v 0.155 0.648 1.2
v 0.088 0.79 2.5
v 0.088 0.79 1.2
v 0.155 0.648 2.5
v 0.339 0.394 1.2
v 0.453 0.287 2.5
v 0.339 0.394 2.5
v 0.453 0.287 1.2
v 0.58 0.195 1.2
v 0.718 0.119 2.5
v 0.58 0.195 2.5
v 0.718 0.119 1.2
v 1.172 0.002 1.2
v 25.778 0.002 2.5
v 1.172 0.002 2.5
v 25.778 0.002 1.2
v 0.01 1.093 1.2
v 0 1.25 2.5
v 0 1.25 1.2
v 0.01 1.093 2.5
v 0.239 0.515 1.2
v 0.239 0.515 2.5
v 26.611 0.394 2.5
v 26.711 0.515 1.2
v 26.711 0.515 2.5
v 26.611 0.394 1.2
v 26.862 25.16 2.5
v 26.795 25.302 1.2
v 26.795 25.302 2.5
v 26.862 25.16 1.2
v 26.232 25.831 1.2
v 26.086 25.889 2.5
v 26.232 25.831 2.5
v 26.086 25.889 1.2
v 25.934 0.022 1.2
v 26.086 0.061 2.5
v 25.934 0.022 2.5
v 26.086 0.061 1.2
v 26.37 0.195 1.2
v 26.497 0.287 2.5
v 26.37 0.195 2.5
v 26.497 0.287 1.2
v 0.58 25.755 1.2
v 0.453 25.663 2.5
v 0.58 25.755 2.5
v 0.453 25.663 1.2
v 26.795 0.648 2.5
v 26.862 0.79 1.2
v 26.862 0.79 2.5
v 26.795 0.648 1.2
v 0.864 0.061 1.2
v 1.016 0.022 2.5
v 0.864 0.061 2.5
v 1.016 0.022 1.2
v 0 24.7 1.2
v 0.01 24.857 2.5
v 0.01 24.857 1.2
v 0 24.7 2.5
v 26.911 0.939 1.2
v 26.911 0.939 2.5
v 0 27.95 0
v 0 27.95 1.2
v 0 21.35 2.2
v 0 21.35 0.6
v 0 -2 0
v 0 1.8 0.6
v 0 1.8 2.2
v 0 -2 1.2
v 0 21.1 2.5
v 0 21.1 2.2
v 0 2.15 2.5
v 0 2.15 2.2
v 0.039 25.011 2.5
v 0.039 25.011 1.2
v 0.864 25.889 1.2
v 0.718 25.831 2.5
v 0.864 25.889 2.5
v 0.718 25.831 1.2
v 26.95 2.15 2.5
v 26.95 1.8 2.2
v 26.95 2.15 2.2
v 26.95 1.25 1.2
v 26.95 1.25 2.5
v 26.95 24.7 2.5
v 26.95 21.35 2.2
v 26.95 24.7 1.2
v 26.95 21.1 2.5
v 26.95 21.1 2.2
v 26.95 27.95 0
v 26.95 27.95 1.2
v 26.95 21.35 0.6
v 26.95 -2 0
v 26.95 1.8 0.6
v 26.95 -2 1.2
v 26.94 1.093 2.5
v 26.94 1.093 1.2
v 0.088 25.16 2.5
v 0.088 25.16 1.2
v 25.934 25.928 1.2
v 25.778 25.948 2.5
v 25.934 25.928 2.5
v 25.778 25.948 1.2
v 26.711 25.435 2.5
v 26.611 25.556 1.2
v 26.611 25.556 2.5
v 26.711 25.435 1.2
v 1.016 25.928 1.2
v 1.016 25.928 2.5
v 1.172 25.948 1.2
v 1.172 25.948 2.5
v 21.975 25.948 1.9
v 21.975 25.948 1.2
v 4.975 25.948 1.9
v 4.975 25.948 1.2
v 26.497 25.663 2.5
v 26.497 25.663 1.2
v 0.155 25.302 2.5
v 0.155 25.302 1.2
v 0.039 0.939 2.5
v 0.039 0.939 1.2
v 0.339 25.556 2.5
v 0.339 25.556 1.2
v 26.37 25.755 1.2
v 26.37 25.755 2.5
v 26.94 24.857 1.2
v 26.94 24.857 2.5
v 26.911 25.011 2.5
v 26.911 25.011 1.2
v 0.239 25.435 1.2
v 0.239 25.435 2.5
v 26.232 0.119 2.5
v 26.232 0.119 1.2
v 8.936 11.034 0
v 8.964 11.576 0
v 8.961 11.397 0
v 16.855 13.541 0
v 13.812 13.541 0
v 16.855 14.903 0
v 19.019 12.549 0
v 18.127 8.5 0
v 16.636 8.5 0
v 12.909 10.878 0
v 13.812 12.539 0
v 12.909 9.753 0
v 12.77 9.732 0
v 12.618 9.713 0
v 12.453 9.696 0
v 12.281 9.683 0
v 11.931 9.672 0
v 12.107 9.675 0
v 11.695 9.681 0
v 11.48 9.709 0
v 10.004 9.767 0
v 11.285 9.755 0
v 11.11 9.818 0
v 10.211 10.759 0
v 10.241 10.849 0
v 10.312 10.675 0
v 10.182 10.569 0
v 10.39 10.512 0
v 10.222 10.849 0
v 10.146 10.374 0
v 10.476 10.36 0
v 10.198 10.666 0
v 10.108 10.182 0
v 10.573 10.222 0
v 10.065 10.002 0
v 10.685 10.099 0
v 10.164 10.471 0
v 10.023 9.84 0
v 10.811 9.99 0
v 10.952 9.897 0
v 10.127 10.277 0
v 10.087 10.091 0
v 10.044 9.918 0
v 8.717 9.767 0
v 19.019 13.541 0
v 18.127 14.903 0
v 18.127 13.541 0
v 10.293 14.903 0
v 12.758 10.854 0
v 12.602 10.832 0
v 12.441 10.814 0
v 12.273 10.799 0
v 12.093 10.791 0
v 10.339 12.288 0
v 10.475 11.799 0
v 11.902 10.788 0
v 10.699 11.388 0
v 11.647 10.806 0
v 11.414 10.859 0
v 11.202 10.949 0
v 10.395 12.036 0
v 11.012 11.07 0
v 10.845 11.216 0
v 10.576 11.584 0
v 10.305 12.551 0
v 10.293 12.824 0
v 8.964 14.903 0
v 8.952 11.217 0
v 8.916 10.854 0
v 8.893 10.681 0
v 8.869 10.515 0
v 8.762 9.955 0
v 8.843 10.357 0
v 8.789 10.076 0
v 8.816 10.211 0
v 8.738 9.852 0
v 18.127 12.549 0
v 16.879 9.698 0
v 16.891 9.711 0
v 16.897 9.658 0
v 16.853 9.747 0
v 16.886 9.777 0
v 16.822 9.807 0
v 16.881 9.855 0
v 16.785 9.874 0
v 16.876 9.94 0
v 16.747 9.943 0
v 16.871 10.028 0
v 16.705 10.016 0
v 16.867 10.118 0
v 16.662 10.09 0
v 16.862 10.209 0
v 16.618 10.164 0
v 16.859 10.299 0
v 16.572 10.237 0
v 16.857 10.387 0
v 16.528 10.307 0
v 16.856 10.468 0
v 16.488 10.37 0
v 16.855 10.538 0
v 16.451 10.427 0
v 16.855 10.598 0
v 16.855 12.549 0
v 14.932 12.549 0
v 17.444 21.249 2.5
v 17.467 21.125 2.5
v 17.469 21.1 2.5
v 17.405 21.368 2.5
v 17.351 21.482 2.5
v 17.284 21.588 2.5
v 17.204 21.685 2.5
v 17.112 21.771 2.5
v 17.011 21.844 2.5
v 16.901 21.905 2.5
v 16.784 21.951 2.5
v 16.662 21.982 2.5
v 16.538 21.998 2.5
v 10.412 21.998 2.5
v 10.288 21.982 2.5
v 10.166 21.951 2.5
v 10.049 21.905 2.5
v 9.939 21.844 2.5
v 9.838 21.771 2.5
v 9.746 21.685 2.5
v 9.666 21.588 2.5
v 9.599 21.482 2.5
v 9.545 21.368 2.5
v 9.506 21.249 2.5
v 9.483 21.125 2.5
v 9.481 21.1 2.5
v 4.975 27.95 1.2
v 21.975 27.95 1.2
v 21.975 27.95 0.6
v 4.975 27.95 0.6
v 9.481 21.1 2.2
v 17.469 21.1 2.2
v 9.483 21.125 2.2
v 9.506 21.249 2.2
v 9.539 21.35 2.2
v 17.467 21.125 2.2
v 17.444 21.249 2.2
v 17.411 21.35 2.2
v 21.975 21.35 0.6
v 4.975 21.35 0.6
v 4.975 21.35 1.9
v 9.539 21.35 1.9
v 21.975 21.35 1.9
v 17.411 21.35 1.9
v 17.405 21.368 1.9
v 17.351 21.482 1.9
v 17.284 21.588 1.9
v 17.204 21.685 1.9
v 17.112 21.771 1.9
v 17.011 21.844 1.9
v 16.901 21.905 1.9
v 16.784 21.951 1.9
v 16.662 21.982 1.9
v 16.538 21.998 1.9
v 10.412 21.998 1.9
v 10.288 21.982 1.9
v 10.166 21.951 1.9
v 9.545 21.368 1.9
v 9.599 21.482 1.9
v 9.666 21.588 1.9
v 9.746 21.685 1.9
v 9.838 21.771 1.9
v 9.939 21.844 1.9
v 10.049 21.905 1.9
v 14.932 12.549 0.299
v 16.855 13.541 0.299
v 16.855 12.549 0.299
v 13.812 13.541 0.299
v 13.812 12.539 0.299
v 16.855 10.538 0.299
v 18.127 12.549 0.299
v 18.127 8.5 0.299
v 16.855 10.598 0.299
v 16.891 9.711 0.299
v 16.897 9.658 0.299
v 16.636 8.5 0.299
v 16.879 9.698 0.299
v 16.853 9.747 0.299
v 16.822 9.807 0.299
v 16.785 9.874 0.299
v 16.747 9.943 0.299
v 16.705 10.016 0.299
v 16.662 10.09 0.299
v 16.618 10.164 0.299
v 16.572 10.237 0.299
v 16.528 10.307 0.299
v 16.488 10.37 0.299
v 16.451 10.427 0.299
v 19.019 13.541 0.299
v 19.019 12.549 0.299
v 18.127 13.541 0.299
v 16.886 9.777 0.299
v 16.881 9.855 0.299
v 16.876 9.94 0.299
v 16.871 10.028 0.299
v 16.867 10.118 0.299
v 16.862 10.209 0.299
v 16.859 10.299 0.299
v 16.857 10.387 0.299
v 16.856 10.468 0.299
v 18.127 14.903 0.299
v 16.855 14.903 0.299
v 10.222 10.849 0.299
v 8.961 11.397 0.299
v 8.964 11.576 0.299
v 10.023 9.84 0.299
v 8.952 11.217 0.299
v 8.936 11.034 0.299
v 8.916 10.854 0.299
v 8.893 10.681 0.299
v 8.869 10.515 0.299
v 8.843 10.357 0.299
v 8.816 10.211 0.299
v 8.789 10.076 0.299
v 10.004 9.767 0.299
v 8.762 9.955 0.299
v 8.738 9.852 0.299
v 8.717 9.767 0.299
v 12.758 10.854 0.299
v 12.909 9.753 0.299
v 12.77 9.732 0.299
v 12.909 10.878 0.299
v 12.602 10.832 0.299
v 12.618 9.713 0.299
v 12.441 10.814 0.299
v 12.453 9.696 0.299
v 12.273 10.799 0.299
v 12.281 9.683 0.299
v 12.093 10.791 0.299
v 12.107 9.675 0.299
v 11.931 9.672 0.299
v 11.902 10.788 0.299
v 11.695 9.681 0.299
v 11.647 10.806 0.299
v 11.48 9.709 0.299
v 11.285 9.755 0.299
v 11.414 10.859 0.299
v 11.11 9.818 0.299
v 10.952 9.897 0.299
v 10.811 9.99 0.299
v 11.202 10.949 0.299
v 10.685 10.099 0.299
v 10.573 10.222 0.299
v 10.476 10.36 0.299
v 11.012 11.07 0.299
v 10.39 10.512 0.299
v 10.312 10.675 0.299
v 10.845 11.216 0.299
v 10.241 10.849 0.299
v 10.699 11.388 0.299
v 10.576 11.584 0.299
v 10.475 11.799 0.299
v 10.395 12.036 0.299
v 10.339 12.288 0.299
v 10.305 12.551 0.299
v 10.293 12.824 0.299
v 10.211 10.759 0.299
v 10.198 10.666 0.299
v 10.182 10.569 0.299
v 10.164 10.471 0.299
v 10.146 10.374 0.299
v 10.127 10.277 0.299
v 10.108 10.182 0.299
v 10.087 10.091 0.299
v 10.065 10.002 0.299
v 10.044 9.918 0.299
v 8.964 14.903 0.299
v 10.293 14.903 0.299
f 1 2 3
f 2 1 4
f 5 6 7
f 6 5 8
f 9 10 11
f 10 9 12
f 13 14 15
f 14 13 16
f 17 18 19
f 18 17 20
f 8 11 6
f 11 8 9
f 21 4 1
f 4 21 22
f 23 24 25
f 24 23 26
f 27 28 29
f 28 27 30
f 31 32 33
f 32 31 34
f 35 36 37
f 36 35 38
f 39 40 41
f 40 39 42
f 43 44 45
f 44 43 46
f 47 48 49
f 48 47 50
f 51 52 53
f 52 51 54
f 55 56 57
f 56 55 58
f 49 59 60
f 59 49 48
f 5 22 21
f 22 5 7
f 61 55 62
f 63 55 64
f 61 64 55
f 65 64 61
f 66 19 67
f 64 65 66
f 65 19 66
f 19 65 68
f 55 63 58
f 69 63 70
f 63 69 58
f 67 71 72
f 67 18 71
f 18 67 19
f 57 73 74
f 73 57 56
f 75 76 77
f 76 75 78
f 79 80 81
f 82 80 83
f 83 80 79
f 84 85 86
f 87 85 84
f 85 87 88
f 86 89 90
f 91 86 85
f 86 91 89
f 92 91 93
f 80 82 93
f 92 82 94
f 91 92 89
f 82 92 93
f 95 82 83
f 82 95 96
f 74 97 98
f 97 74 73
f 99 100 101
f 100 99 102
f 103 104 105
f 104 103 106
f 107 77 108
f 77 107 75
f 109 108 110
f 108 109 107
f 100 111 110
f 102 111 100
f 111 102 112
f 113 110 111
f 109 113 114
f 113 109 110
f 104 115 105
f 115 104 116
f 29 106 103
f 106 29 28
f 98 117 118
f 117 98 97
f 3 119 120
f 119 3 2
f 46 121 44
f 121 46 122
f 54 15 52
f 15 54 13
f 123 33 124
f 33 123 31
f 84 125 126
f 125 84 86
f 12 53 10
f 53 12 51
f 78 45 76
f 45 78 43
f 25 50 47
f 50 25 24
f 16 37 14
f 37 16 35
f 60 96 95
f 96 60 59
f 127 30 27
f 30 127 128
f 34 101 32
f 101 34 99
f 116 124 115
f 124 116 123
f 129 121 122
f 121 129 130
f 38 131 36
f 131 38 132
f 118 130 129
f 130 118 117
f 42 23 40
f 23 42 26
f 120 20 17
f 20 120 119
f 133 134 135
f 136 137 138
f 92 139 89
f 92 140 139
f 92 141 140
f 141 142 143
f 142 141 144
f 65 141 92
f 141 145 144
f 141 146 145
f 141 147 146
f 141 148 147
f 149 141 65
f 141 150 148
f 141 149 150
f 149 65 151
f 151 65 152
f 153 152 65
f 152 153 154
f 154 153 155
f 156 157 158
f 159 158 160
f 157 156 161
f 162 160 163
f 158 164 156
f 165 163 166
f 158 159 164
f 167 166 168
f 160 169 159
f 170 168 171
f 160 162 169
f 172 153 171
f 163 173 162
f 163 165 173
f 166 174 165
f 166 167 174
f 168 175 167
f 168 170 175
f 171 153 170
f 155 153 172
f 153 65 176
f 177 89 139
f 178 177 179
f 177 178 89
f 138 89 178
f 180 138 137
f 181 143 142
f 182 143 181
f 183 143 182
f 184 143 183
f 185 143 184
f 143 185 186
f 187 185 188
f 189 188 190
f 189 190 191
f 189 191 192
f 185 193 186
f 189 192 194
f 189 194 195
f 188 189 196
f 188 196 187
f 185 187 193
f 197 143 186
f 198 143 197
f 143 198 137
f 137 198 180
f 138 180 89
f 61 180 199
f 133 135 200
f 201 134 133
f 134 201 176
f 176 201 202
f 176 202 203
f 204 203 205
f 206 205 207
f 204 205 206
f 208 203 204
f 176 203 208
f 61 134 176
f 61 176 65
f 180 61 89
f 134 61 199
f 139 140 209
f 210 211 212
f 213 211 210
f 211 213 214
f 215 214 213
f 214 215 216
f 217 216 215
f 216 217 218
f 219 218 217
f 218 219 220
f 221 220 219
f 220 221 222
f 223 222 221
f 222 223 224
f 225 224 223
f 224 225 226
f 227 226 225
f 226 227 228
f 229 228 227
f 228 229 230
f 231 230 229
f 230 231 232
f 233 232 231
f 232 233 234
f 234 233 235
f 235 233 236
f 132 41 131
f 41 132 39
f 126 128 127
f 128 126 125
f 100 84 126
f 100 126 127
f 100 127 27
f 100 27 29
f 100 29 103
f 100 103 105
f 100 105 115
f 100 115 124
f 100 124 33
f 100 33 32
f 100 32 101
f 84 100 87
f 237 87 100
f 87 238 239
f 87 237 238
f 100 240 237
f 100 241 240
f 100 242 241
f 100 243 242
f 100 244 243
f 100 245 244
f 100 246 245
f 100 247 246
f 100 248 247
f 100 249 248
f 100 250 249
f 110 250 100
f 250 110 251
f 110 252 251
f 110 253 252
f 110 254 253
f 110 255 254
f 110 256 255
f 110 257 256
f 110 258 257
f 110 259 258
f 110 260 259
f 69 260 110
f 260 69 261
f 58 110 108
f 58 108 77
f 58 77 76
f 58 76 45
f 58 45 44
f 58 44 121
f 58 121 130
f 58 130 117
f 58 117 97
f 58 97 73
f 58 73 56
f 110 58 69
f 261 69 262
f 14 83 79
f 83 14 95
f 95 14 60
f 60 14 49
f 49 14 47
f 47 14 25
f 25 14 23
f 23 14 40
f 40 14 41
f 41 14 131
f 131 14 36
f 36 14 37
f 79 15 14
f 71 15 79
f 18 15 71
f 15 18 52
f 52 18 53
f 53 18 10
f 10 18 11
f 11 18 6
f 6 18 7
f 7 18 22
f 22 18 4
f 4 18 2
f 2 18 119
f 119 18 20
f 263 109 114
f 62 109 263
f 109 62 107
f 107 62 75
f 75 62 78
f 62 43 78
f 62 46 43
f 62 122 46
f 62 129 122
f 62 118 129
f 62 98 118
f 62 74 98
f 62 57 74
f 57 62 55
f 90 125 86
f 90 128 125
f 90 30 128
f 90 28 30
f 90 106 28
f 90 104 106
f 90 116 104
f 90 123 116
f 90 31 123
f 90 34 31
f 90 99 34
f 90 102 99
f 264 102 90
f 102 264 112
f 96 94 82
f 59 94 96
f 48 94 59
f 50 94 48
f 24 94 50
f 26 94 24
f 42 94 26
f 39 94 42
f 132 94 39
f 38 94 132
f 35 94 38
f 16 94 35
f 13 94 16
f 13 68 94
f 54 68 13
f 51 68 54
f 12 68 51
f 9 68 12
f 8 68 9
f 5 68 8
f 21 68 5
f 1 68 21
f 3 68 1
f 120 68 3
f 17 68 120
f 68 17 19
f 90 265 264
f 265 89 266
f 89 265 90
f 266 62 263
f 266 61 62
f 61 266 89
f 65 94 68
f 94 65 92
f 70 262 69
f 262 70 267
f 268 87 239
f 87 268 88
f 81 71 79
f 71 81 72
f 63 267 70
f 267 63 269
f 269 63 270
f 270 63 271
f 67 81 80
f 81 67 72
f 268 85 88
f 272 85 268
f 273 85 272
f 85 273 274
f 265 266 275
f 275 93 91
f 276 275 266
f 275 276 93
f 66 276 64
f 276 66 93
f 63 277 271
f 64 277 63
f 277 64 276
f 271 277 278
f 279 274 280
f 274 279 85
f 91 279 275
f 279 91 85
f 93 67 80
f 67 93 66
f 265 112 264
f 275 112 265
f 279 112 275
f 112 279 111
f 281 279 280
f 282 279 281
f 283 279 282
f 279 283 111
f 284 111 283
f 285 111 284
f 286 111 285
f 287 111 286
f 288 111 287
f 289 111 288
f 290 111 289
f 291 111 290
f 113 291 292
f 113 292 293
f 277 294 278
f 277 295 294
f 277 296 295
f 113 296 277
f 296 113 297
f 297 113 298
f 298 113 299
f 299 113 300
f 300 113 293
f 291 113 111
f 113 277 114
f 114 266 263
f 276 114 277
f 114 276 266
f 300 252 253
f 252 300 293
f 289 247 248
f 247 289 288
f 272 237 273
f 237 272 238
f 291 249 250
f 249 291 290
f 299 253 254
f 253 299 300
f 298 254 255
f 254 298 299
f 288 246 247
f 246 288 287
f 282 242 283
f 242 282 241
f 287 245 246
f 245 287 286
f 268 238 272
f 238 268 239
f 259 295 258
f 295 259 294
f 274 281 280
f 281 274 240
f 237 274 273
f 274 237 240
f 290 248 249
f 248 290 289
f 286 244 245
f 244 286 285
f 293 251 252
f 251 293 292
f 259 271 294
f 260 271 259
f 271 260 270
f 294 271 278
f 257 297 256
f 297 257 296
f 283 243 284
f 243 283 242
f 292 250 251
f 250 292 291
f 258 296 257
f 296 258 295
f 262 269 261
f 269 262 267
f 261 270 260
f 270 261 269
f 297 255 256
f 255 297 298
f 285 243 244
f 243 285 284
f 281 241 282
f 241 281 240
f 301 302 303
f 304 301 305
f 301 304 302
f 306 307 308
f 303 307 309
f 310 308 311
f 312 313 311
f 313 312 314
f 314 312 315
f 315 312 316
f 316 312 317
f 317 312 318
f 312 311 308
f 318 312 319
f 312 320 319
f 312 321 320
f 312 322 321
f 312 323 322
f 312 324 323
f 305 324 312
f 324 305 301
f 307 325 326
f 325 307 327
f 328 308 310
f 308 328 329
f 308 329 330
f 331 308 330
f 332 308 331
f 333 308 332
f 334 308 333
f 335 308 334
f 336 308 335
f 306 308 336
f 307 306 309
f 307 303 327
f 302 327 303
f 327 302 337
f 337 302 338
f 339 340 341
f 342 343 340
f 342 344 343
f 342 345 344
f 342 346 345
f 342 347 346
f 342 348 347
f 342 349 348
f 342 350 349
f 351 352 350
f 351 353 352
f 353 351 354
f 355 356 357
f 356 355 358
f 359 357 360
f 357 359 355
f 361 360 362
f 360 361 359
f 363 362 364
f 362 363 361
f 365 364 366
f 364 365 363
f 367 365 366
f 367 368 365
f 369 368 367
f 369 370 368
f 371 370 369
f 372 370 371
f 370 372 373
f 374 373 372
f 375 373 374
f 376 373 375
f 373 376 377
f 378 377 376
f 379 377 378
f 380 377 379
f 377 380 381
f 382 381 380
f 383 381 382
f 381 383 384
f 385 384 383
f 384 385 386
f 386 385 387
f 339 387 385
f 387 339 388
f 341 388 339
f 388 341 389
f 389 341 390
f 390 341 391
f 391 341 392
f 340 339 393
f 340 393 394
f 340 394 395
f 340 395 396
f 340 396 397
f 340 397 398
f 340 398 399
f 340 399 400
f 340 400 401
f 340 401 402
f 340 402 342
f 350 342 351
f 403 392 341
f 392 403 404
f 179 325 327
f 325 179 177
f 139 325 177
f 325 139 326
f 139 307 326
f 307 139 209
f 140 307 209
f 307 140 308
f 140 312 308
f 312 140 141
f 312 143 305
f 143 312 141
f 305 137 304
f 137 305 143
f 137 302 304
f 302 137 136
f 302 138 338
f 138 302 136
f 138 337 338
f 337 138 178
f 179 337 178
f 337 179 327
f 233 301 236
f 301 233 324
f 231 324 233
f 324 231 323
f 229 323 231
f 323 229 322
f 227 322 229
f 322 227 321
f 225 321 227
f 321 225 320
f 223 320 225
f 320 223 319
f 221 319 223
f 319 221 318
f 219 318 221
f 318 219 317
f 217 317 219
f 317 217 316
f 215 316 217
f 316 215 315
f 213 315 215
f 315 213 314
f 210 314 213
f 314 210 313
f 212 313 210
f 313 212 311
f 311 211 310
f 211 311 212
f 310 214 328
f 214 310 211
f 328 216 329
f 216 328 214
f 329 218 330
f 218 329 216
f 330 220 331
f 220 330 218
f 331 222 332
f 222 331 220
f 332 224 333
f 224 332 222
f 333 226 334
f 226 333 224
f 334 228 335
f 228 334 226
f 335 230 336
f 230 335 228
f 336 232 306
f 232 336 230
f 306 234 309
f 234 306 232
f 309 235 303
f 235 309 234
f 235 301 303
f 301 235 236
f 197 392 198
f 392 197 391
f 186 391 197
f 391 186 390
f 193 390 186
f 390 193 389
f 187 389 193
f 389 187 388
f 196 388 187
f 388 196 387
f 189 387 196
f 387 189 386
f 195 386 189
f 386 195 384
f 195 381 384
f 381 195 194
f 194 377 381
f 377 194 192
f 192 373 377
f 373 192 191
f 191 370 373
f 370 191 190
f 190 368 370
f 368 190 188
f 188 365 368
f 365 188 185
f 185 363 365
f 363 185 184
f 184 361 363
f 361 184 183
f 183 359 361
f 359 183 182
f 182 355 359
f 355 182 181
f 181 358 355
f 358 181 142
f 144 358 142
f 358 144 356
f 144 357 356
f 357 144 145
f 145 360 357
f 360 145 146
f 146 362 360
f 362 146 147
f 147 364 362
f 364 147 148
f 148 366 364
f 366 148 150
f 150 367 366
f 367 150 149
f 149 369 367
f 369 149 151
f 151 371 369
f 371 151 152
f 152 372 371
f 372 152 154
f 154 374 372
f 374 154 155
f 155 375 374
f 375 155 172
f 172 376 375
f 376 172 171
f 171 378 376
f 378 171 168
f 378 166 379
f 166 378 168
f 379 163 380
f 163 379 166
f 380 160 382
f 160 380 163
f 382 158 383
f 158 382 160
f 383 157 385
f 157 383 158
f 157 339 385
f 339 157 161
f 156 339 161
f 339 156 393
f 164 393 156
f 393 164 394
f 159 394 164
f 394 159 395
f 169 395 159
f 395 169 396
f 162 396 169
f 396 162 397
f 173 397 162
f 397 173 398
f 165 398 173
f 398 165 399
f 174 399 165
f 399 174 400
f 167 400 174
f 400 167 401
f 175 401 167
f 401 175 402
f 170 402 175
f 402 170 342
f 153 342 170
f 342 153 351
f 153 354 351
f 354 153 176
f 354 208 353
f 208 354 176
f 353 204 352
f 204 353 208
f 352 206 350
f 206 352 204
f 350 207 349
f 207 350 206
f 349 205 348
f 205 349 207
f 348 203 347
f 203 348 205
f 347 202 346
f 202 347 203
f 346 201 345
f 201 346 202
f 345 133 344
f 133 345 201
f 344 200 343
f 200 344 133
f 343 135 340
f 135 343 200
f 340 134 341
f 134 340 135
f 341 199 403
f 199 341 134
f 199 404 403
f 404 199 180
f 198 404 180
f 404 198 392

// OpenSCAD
module cube_rounded_xy(x,y,z,r) {
    $fn=50;
    translate([r,r,0]) minkowski()
    {
      cube([x-2*r,y-2*r,z-r/4]);
      cylinder(r=r,h=r/4);
    }
}

revision = "r4";
text_font = "Liberation Mono:style=Bold";
text_size = 7;

surf_offset = 0.001;
disp_thickness = 1.6;
disp_emboss = 0.3;
disp_x = 27-0.05;
disp_y = 19.5+0.05;

cutout_y = 26-0.05;
cutout_thickness = 2.5;

pcb_thickness = 1.3;

module disp_holder(print_support) {
    difference() {
        union() {
            cube_rounded_xy(disp_x, cutout_y, cutout_thickness, 1.25);    
            translate([0,-2,0]) cube([disp_x,cutout_y+2*2,cutout_thickness-pcb_thickness]);
        }
        
        translate([-0.5, 2+disp_emboss/2, cutout_thickness-disp_thickness+surf_offset]) cube([disp_x+1,disp_y-disp_emboss*2,disp_thickness]);
        
        //display space
        translate([-0.5, 2-0.2, cutout_thickness-disp_thickness-disp_emboss]) cube([disp_x+1,disp_y,disp_thickness]);
        
        //flex cable cutout
        translate([(disp_x-17)/2,21,cutout_thickness-disp_thickness -0.3]) cube([17,10,1.3]);
        
        //tape cutout
        translate([(disp_x-8)/2,14,cutout_thickness-1]) cube_rounded_xy(8, 8, 1, 1);
        
        //revision text
        translate([disp_x/2,disp_y/2+2,0.3-surf_offset]) rotate([180,0,0]) linear_extrude(height = 0.3) {
            text(revision, size = text_size, font = text_font, halign = "center", valign = "center", $fn = 16);
        }
    }
    if(print_support) {
        translate([0,2-0.2,0]) //cylinder(r1=1,r2=1, h=pcb_thickness+disp_thickness-disp_emboss*2,$fn=30);
        cube([0.2,0.35,pcb_thickness+disp_thickness-disp_emboss*2], center = false);
        translate([disp_x-0.2,2-0.2,0]) //cylinder(r1=1,r2=1, h=pcb_thickness+disp_thickness-disp_emboss*2,$fn=30);
        cube([0.2,0.35,pcb_thickness+disp_thickness-disp_emboss*2], center = false);
    }
}


disp_holder(false);
/*
for ( i = [0 : 3] ){
    translate([0.5-(disp_x+1)*i,0,0.5]) rotate([0,-90,0]) cylinder(r=0.35, h=2, $fn=64);
    translate([0.5-(disp_x+1)*i,24,0.5]) rotate([0,-90,0]) cylinder(r=0.35, h=2, $fn=64);
    translate([-(disp_x+1)*(i+1),0,0]) disp_holder();
}
*/
